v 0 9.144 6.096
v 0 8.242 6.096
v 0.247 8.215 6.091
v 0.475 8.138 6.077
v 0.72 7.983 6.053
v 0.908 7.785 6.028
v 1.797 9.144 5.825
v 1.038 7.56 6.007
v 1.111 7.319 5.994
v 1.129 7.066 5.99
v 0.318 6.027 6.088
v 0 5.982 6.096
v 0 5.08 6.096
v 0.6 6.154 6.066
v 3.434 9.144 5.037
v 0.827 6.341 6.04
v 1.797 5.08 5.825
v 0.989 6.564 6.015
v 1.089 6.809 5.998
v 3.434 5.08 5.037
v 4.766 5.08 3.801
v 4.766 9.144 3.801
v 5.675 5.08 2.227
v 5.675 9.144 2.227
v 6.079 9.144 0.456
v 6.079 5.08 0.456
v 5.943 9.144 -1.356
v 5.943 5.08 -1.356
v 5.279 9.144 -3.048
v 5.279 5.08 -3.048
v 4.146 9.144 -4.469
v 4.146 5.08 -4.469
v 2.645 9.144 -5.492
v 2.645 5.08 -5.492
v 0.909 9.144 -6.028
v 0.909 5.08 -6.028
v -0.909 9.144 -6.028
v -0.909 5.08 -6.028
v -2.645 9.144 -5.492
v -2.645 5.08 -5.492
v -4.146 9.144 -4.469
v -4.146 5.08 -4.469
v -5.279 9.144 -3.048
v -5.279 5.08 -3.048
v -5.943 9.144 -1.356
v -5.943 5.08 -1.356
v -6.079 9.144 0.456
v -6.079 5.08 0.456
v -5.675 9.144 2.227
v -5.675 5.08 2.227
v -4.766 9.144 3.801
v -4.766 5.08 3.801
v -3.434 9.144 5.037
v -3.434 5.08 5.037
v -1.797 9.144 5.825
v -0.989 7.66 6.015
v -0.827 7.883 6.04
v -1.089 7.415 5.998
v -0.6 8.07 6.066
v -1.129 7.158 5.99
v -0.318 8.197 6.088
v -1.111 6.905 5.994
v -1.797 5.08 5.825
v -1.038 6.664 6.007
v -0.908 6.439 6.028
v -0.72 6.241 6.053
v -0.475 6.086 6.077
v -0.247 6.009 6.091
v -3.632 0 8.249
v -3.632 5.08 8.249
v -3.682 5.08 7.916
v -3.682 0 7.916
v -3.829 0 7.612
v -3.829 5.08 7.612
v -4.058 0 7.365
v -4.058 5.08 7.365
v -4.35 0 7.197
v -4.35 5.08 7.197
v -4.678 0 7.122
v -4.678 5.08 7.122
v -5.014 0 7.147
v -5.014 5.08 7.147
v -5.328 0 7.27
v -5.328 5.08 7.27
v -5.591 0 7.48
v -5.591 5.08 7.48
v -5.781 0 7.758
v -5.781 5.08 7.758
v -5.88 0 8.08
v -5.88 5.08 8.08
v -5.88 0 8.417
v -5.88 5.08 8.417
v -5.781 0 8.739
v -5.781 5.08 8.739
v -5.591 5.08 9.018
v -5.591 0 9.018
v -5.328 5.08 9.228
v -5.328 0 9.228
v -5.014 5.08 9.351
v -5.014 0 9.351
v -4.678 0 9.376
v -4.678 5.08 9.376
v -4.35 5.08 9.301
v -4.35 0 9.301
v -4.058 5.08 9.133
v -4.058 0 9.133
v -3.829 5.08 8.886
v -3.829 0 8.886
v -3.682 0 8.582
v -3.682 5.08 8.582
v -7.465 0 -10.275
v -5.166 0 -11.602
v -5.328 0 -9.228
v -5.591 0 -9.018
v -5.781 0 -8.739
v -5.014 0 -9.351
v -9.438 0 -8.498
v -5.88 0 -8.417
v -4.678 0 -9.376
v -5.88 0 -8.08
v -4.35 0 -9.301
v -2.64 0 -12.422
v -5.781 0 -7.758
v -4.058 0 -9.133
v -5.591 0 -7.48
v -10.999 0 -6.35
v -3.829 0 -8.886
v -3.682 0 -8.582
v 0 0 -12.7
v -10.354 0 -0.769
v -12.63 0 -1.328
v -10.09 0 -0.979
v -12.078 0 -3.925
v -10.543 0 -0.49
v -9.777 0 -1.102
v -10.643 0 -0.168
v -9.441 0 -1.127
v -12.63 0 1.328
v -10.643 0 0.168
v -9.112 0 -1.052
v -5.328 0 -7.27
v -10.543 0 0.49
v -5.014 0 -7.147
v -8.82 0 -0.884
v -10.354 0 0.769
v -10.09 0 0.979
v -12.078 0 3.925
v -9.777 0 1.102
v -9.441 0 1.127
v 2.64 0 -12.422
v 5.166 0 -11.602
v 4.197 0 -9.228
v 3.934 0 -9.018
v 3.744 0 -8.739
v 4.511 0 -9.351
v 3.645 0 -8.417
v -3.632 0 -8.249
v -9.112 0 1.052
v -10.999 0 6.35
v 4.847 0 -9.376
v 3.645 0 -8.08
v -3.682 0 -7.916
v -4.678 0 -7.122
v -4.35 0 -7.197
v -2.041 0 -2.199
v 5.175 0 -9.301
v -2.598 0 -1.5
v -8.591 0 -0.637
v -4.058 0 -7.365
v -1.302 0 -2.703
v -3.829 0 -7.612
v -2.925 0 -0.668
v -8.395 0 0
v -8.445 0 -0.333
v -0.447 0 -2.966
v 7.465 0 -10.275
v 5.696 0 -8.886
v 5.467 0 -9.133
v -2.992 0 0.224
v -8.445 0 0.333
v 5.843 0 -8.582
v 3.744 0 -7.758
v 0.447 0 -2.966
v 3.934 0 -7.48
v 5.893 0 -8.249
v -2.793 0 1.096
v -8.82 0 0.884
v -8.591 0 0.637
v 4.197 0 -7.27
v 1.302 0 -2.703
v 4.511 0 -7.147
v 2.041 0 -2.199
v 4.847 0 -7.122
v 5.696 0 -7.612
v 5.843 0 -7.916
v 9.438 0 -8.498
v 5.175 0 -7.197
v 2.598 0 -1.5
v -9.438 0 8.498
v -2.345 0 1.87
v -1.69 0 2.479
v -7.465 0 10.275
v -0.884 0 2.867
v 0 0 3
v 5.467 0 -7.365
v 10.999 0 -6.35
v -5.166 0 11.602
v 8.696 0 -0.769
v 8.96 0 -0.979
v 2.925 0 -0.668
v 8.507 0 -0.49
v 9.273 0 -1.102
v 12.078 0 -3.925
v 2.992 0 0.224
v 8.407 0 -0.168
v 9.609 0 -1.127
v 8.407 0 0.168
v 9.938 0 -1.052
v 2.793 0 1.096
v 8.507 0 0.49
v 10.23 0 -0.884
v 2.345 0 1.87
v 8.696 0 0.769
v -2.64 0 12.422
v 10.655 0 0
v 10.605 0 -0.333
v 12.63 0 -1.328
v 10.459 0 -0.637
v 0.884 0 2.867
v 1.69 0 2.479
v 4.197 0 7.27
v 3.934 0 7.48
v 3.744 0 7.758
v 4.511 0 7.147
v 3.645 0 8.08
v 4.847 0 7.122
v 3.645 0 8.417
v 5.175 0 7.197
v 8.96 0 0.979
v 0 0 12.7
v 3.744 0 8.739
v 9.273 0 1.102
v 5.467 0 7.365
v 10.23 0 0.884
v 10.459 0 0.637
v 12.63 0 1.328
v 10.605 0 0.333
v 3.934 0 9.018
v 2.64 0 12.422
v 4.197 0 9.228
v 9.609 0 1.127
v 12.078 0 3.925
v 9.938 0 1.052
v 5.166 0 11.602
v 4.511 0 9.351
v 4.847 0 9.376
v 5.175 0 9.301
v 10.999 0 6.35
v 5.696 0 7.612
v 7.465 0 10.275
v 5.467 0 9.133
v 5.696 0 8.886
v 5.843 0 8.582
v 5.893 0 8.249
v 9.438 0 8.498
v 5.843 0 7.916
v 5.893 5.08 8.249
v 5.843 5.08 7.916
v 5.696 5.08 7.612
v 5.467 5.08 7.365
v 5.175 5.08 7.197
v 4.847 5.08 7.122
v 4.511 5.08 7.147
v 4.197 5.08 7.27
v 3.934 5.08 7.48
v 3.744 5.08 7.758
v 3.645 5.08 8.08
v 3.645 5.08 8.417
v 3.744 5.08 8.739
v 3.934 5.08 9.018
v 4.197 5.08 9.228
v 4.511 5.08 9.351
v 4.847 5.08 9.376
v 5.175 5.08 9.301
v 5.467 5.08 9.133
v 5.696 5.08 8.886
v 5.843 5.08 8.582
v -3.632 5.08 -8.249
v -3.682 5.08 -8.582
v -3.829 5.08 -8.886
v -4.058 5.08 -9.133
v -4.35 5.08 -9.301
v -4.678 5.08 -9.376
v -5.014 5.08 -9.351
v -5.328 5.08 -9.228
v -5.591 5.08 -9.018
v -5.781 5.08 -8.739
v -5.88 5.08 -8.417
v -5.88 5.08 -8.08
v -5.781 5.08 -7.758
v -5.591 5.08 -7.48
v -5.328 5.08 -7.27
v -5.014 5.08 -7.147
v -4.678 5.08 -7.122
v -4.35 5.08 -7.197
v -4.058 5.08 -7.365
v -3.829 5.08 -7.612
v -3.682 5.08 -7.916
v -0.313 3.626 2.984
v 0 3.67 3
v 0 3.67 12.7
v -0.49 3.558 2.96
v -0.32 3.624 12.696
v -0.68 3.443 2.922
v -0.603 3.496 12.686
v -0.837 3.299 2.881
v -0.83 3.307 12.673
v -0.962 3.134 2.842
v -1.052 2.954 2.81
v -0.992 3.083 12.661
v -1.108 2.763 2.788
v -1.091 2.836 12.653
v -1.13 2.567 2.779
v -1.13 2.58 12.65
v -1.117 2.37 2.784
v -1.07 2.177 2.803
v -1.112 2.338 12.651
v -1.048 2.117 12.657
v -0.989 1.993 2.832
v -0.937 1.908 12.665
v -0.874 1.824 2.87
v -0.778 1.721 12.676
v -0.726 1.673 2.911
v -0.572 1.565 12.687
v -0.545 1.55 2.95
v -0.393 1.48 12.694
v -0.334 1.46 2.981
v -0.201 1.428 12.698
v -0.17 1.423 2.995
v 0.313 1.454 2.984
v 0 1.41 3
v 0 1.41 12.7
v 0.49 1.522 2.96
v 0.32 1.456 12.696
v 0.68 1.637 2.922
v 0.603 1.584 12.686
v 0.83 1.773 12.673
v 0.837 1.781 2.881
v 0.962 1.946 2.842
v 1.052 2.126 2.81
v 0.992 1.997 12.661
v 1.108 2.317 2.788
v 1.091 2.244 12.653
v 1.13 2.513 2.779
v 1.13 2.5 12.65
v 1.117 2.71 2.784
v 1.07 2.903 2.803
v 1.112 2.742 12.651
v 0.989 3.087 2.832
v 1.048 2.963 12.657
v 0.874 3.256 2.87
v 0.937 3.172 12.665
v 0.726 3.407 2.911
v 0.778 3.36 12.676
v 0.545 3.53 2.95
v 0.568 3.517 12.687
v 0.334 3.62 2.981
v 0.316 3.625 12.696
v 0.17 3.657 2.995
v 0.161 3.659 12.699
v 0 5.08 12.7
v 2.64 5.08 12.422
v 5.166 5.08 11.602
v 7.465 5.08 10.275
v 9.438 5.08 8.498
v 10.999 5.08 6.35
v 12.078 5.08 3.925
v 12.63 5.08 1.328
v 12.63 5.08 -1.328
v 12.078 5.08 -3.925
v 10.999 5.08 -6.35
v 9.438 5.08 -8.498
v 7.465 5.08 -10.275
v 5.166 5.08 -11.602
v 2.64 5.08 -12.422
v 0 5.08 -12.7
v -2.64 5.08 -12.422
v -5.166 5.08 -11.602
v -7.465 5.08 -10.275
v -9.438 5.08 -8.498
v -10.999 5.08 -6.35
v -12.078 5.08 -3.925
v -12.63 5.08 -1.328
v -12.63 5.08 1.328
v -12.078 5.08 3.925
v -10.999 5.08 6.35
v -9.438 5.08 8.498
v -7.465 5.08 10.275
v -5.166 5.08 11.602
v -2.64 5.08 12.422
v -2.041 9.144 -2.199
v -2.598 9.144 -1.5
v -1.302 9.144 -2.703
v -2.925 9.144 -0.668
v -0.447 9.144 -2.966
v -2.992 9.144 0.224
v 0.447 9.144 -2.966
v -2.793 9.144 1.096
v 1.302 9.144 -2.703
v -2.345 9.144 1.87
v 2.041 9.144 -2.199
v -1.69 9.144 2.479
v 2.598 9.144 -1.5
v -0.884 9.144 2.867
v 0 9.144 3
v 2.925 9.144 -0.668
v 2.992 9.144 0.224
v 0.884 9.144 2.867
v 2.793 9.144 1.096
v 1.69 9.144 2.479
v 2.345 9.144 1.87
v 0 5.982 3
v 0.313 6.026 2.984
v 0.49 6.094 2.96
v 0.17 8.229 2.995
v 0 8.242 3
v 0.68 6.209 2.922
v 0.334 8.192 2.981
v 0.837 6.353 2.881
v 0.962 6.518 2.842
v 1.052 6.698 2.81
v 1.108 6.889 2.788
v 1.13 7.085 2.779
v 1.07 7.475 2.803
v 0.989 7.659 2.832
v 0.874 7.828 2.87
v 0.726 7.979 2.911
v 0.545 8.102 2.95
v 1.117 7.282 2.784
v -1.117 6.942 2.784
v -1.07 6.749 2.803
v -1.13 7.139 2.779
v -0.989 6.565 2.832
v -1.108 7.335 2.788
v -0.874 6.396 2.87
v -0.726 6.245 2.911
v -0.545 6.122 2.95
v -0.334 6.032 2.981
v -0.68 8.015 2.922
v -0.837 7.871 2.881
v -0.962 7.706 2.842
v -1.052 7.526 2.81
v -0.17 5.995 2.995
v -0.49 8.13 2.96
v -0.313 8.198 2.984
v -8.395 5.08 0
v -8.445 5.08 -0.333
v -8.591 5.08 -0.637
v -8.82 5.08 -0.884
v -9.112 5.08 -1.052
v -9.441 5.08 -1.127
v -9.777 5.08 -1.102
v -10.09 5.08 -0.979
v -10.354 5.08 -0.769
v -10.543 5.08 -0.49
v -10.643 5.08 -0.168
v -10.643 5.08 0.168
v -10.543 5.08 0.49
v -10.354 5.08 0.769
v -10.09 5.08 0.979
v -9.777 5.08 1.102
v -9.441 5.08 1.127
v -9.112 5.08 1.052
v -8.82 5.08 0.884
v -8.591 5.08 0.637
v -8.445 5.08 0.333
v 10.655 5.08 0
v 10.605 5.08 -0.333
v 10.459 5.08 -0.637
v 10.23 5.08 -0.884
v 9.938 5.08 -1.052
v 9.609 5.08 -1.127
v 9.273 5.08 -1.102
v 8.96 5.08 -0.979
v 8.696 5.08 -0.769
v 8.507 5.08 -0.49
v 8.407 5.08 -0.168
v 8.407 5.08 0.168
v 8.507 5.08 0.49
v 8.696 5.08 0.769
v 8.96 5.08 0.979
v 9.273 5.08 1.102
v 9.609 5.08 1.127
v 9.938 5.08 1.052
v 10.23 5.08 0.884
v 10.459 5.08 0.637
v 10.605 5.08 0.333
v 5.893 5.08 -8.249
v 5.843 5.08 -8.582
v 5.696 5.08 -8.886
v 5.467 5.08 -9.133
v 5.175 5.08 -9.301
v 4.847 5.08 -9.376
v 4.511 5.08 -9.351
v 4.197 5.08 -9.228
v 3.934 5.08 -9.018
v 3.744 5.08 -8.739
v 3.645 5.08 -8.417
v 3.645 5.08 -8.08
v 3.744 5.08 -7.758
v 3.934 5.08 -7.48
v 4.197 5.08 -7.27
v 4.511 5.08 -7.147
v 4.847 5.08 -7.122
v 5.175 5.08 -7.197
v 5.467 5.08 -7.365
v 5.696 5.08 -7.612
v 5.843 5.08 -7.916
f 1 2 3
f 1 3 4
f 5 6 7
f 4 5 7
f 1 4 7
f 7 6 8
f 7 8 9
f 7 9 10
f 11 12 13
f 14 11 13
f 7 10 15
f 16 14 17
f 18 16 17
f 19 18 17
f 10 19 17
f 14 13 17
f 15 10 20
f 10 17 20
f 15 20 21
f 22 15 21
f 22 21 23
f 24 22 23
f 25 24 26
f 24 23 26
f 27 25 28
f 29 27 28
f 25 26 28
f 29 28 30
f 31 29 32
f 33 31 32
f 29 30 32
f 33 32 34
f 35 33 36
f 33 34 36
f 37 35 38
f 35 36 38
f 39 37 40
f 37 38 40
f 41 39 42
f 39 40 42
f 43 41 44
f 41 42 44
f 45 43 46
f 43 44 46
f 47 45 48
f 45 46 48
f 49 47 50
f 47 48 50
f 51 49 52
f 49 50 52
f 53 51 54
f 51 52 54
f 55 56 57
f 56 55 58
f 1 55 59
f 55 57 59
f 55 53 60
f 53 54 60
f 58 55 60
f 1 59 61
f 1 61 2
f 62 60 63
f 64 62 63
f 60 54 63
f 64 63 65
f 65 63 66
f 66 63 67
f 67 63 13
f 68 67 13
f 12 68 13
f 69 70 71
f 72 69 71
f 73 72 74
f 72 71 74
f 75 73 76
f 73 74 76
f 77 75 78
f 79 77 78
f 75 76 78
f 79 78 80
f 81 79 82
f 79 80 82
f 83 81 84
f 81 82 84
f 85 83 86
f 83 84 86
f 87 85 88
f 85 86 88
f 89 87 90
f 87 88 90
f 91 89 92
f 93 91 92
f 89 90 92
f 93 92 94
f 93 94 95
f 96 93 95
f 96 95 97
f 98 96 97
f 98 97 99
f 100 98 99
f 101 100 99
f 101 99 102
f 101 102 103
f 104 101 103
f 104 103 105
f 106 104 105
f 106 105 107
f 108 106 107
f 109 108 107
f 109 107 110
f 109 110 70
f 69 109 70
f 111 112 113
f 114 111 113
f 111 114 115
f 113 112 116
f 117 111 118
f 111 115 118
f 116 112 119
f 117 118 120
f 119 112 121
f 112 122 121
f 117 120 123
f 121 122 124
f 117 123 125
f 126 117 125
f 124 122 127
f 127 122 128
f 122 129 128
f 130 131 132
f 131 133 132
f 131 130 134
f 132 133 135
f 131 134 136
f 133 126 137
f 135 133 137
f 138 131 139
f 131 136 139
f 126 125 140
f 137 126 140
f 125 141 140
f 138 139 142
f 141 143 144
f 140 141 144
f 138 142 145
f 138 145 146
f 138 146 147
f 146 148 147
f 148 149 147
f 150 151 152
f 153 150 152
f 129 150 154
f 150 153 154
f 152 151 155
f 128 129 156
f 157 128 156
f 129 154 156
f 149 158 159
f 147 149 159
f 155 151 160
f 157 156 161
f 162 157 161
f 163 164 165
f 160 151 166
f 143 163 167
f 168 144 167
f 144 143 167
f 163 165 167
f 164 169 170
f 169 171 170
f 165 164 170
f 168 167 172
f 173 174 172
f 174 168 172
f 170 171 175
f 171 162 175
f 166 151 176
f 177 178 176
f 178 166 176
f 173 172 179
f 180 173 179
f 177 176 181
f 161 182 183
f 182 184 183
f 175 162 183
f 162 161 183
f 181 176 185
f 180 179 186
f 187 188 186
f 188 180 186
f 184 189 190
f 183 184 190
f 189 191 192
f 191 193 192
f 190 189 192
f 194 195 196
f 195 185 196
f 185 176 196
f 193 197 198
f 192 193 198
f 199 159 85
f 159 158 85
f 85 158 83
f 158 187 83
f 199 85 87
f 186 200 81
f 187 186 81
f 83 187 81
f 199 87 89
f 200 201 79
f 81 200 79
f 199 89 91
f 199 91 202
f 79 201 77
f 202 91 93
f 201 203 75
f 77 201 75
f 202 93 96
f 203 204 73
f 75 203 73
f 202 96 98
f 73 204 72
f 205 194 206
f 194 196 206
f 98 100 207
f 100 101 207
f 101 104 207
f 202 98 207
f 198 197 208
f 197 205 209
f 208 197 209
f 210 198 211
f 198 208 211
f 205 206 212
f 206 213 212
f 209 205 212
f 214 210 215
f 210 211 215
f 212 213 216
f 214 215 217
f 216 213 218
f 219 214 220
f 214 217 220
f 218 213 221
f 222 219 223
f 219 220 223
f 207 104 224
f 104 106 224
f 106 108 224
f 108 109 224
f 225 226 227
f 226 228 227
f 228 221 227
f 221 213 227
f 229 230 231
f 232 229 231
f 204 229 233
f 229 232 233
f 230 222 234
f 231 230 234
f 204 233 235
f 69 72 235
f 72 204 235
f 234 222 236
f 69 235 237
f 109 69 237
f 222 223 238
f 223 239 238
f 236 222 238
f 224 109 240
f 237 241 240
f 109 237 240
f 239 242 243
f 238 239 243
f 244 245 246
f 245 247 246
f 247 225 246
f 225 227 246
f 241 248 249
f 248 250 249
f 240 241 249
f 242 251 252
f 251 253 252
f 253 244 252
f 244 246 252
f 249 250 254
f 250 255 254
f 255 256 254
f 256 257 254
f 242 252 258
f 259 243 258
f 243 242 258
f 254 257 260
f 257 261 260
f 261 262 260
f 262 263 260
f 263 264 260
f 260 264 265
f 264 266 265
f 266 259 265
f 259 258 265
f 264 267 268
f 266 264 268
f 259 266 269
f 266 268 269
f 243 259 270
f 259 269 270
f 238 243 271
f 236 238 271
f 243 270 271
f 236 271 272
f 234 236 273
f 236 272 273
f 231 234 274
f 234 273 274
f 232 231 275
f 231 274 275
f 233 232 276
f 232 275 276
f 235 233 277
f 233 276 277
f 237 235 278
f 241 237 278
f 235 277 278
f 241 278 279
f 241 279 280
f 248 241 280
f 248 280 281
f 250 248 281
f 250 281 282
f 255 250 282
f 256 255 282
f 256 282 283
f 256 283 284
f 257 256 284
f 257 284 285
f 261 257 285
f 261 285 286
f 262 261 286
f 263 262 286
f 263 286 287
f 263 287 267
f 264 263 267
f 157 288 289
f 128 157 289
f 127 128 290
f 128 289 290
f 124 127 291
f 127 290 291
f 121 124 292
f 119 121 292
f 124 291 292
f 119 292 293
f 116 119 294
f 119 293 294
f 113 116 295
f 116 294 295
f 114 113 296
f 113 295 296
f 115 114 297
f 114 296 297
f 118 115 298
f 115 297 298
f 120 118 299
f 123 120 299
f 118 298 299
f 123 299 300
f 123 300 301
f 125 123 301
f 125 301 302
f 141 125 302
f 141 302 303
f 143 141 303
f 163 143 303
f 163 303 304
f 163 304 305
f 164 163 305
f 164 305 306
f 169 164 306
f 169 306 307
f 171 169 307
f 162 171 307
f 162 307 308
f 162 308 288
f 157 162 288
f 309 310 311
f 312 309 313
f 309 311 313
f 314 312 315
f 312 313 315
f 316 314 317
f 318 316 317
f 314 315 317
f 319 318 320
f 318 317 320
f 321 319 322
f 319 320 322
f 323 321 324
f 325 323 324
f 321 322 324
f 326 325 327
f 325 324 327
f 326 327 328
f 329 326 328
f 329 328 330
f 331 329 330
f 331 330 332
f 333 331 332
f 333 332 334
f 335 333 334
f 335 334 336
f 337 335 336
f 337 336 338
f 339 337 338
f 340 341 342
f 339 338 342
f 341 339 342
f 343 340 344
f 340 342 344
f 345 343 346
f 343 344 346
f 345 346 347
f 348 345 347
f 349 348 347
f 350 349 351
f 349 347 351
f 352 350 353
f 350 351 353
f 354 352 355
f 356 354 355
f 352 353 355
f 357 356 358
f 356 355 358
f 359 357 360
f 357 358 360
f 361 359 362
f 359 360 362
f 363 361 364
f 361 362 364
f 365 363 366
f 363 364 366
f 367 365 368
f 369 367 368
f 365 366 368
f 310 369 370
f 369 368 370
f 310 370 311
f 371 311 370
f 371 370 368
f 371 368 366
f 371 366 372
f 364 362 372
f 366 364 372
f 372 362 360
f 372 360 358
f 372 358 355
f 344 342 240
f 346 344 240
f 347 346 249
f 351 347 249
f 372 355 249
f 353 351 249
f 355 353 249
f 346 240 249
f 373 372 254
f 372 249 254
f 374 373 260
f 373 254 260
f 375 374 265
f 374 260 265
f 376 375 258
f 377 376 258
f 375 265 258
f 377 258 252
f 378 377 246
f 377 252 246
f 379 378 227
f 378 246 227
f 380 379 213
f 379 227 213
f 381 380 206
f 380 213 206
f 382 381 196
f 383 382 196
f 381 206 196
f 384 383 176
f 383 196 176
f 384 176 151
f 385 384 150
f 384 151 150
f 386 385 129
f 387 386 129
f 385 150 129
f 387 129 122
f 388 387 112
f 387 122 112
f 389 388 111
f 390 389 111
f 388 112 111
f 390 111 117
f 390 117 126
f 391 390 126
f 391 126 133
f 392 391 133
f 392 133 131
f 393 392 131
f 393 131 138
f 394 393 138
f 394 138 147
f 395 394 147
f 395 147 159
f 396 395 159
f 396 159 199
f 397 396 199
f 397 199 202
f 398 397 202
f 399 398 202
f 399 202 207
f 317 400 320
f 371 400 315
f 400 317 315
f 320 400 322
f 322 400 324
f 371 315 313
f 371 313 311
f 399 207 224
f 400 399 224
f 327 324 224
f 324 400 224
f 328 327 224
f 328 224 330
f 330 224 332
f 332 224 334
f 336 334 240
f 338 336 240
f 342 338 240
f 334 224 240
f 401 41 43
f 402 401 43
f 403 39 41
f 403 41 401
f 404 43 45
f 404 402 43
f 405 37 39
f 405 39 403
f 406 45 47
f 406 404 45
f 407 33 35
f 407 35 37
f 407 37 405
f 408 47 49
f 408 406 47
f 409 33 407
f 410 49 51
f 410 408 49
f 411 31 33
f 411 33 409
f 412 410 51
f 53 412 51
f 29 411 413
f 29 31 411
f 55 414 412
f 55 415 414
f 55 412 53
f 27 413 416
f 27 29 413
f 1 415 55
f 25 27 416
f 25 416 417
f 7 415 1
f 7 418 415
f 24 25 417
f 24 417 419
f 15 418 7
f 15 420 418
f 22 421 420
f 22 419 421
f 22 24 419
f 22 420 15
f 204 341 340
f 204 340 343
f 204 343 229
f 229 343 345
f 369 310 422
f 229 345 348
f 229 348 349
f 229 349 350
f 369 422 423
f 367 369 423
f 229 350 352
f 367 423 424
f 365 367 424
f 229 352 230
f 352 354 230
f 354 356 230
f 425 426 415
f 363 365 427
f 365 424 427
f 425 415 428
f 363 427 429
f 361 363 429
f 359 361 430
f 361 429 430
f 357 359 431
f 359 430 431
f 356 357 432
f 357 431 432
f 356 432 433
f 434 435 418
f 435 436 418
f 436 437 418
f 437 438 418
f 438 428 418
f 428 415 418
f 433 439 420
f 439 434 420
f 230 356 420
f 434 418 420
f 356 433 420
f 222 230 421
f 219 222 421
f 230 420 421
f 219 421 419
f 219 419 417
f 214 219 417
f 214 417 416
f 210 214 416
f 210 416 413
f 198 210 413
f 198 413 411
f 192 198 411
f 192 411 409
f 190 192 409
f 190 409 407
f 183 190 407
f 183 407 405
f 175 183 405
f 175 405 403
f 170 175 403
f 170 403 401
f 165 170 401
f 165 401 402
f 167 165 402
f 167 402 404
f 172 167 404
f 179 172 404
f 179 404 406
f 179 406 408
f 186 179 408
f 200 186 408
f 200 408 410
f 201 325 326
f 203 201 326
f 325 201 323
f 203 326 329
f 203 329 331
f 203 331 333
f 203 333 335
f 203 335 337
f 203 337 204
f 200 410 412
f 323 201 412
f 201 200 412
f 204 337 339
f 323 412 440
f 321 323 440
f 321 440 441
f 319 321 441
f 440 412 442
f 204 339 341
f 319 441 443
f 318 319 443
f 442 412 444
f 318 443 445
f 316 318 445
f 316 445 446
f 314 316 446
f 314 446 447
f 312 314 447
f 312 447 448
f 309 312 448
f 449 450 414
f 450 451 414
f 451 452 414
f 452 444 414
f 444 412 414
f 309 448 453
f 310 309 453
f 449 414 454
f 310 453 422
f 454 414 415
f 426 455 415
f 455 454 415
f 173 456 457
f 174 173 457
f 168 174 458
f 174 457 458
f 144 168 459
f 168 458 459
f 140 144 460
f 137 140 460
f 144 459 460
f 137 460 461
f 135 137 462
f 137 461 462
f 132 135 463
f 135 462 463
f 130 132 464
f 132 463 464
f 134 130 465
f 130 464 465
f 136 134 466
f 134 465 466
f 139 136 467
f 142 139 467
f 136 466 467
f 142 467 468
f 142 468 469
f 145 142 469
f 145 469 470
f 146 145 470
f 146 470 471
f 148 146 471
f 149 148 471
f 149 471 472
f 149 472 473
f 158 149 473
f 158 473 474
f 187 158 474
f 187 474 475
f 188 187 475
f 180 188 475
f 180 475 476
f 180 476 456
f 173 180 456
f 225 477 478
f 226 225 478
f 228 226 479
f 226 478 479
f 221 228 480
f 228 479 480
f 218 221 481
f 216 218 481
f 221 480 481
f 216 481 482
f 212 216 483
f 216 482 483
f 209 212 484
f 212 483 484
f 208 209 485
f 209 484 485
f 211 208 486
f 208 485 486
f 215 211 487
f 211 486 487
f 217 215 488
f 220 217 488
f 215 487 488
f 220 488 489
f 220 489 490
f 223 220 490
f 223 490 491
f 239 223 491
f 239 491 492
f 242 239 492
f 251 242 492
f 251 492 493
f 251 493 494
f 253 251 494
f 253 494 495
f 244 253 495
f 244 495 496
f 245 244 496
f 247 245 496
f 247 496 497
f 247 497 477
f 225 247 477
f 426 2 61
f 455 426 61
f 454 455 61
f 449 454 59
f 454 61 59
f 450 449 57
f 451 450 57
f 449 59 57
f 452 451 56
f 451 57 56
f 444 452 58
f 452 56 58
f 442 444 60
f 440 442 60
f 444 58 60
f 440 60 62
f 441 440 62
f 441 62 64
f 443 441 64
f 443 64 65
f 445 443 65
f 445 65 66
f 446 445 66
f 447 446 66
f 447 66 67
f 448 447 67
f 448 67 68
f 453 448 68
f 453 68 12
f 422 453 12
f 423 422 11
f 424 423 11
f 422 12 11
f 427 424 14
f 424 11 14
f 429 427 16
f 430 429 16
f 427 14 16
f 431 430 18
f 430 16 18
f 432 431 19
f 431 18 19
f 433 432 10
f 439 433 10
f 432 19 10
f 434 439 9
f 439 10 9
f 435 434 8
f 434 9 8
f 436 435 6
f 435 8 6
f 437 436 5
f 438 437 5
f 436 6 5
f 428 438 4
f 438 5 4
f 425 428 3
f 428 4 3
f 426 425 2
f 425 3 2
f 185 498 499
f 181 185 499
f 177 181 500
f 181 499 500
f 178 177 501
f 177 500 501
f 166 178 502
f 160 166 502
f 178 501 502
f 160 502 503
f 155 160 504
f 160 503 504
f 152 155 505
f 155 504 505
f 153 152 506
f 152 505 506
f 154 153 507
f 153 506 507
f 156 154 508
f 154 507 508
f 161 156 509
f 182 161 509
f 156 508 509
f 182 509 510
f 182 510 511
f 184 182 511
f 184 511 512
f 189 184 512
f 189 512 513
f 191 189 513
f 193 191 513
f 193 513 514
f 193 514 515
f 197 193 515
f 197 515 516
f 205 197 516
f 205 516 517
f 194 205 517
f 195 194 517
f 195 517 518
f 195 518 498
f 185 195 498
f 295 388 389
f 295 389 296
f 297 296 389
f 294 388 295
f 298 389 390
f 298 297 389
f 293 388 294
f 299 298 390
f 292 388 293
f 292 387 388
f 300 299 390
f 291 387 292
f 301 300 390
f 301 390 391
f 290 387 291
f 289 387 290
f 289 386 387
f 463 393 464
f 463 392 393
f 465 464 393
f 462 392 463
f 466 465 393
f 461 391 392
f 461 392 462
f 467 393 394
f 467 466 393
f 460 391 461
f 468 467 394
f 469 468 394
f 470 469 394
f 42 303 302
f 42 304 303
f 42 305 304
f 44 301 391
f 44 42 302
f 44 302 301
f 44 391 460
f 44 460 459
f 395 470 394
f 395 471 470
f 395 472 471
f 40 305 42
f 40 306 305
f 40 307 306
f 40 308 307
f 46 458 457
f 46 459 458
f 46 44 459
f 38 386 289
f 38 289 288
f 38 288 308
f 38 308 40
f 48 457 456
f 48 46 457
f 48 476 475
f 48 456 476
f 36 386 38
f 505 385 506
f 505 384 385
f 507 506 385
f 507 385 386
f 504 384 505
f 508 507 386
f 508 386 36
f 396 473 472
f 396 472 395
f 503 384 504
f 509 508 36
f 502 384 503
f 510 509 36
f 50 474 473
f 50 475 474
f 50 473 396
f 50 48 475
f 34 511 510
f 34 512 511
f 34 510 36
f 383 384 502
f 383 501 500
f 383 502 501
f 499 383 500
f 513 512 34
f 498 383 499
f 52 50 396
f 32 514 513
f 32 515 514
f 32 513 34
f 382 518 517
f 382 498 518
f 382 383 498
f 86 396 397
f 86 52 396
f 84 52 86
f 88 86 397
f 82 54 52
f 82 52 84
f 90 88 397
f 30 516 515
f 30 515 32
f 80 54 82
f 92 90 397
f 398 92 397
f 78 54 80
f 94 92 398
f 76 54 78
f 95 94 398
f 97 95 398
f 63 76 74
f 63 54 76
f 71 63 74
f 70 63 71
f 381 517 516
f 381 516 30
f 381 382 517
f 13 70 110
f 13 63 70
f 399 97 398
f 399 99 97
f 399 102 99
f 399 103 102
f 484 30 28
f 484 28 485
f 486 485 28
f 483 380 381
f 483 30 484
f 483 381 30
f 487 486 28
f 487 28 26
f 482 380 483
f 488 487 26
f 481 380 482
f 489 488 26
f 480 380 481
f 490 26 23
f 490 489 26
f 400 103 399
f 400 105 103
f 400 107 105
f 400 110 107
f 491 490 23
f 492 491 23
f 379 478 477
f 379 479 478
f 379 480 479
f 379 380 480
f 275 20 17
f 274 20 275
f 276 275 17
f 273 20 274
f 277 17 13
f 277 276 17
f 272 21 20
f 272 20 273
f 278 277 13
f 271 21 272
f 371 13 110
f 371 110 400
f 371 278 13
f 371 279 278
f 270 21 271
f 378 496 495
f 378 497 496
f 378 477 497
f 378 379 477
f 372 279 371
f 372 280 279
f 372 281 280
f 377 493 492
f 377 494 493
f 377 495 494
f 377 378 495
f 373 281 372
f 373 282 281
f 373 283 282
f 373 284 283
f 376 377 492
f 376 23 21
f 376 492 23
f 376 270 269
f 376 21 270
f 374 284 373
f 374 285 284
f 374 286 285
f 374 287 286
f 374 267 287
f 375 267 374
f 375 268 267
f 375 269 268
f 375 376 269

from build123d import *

# Parameters (mm, degrees)
SKETCH1_R                      = 12.7
BOSS_EXTRUDE1_DEPTH            = 5.08
SKETCH2_R                      = 6.096
BOSS_EXTRUDE2_DEPTH            = 4.064
SKETCH3_R                      = 3
CUT_EXTRUDE1_DEPTH             = 21.154223776
SKETCH7_W                      = 1.1303
SKETCH7_H                      = 12.7
F_4_40_TAPPED_HOLE1_AT_2_COUNT = 2
F_4_40_TAPPED_HOLE1_AT_2_PITCH = 4.572
F_4_40_TAPPED_HOLE2_D          = 2.2606


with BuildPart() as part:
    # Sketch1 → Boss-Extrude1 (new body)
    with BuildSketch(Plane(origin=(0, 0, 0), x_dir=(1, 0, 0), z_dir=(0, 1, 0))):
        with Locations(Location((0, 0, 0), (0, 0, 270))):
            Circle(SKETCH1_R)
    extrude(amount=BOSS_EXTRUDE1_DEPTH)

    # Sketch2 → Boss-Extrude2 (add)
    with BuildSketch(Plane(origin=(0, 5.08, 0), x_dir=(1, 0, 0), z_dir=(0, 1, 0))):
        with Locations(Location((0, 0, 0), (0, 0, 270))):
            Circle(SKETCH2_R)
    extrude(amount=BOSS_EXTRUDE2_DEPTH)

    # Sketch3 → Cut-Extrude1 (cut, through all)
    with BuildSketch(Plane(origin=(0, 9.144, 0), x_dir=(1, 0, 0), z_dir=(0, 1, 0))):
        with Locations(Location((0, 0, 0), (0, 0, 270))):
            Circle(SKETCH3_R)
    extrude(amount=-CUT_EXTRUDE1_DEPTH, mode=Mode.SUBTRACT)

    # Sketch7 → #4-40 Tapped Hole1 (revolve, cut)
    with BuildSketch(Plane(origin=(0, 7.112, 0), x_dir=(0, 1, 0), z_dir=(1, 0, 0))):
        with Locations((0.56515, 6.35)):
            Rectangle(SKETCH7_W, SKETCH7_H)
    f_4_40_tapped_hole1 = revolve(axis=Axis((0, 7.112, -6.35), (0, 0, 1)), mode=Mode.SUBTRACT)

    # #4-40 Tapped Hole1 at 2: #4-40 Tapped Hole1 ×2
    with Locations(*[(0, -i * F_4_40_TAPPED_HOLE1_AT_2_PITCH, 0) for i in range(1, F_4_40_TAPPED_HOLE1_AT_2_COUNT)]):
        add(f_4_40_tapped_hole1, mode=Mode.SUBTRACT)

    # #4-40 Tapped Hole2 (through all)
    with Locations(Plane(origin=(0, 0, 0), x_dir=(-1, 0, 0), z_dir=(0, -1, 0))):
        with Locations((9.525, 0), (4.7625, -8.248891971), (-4.7625, -8.248891971), (-9.525, 0), (-4.7625, 8.248891971), (4.7625, 8.248891971)):
            Hole(F_4_40_TAPPED_HOLE2_D / 2)


solid = part.part
